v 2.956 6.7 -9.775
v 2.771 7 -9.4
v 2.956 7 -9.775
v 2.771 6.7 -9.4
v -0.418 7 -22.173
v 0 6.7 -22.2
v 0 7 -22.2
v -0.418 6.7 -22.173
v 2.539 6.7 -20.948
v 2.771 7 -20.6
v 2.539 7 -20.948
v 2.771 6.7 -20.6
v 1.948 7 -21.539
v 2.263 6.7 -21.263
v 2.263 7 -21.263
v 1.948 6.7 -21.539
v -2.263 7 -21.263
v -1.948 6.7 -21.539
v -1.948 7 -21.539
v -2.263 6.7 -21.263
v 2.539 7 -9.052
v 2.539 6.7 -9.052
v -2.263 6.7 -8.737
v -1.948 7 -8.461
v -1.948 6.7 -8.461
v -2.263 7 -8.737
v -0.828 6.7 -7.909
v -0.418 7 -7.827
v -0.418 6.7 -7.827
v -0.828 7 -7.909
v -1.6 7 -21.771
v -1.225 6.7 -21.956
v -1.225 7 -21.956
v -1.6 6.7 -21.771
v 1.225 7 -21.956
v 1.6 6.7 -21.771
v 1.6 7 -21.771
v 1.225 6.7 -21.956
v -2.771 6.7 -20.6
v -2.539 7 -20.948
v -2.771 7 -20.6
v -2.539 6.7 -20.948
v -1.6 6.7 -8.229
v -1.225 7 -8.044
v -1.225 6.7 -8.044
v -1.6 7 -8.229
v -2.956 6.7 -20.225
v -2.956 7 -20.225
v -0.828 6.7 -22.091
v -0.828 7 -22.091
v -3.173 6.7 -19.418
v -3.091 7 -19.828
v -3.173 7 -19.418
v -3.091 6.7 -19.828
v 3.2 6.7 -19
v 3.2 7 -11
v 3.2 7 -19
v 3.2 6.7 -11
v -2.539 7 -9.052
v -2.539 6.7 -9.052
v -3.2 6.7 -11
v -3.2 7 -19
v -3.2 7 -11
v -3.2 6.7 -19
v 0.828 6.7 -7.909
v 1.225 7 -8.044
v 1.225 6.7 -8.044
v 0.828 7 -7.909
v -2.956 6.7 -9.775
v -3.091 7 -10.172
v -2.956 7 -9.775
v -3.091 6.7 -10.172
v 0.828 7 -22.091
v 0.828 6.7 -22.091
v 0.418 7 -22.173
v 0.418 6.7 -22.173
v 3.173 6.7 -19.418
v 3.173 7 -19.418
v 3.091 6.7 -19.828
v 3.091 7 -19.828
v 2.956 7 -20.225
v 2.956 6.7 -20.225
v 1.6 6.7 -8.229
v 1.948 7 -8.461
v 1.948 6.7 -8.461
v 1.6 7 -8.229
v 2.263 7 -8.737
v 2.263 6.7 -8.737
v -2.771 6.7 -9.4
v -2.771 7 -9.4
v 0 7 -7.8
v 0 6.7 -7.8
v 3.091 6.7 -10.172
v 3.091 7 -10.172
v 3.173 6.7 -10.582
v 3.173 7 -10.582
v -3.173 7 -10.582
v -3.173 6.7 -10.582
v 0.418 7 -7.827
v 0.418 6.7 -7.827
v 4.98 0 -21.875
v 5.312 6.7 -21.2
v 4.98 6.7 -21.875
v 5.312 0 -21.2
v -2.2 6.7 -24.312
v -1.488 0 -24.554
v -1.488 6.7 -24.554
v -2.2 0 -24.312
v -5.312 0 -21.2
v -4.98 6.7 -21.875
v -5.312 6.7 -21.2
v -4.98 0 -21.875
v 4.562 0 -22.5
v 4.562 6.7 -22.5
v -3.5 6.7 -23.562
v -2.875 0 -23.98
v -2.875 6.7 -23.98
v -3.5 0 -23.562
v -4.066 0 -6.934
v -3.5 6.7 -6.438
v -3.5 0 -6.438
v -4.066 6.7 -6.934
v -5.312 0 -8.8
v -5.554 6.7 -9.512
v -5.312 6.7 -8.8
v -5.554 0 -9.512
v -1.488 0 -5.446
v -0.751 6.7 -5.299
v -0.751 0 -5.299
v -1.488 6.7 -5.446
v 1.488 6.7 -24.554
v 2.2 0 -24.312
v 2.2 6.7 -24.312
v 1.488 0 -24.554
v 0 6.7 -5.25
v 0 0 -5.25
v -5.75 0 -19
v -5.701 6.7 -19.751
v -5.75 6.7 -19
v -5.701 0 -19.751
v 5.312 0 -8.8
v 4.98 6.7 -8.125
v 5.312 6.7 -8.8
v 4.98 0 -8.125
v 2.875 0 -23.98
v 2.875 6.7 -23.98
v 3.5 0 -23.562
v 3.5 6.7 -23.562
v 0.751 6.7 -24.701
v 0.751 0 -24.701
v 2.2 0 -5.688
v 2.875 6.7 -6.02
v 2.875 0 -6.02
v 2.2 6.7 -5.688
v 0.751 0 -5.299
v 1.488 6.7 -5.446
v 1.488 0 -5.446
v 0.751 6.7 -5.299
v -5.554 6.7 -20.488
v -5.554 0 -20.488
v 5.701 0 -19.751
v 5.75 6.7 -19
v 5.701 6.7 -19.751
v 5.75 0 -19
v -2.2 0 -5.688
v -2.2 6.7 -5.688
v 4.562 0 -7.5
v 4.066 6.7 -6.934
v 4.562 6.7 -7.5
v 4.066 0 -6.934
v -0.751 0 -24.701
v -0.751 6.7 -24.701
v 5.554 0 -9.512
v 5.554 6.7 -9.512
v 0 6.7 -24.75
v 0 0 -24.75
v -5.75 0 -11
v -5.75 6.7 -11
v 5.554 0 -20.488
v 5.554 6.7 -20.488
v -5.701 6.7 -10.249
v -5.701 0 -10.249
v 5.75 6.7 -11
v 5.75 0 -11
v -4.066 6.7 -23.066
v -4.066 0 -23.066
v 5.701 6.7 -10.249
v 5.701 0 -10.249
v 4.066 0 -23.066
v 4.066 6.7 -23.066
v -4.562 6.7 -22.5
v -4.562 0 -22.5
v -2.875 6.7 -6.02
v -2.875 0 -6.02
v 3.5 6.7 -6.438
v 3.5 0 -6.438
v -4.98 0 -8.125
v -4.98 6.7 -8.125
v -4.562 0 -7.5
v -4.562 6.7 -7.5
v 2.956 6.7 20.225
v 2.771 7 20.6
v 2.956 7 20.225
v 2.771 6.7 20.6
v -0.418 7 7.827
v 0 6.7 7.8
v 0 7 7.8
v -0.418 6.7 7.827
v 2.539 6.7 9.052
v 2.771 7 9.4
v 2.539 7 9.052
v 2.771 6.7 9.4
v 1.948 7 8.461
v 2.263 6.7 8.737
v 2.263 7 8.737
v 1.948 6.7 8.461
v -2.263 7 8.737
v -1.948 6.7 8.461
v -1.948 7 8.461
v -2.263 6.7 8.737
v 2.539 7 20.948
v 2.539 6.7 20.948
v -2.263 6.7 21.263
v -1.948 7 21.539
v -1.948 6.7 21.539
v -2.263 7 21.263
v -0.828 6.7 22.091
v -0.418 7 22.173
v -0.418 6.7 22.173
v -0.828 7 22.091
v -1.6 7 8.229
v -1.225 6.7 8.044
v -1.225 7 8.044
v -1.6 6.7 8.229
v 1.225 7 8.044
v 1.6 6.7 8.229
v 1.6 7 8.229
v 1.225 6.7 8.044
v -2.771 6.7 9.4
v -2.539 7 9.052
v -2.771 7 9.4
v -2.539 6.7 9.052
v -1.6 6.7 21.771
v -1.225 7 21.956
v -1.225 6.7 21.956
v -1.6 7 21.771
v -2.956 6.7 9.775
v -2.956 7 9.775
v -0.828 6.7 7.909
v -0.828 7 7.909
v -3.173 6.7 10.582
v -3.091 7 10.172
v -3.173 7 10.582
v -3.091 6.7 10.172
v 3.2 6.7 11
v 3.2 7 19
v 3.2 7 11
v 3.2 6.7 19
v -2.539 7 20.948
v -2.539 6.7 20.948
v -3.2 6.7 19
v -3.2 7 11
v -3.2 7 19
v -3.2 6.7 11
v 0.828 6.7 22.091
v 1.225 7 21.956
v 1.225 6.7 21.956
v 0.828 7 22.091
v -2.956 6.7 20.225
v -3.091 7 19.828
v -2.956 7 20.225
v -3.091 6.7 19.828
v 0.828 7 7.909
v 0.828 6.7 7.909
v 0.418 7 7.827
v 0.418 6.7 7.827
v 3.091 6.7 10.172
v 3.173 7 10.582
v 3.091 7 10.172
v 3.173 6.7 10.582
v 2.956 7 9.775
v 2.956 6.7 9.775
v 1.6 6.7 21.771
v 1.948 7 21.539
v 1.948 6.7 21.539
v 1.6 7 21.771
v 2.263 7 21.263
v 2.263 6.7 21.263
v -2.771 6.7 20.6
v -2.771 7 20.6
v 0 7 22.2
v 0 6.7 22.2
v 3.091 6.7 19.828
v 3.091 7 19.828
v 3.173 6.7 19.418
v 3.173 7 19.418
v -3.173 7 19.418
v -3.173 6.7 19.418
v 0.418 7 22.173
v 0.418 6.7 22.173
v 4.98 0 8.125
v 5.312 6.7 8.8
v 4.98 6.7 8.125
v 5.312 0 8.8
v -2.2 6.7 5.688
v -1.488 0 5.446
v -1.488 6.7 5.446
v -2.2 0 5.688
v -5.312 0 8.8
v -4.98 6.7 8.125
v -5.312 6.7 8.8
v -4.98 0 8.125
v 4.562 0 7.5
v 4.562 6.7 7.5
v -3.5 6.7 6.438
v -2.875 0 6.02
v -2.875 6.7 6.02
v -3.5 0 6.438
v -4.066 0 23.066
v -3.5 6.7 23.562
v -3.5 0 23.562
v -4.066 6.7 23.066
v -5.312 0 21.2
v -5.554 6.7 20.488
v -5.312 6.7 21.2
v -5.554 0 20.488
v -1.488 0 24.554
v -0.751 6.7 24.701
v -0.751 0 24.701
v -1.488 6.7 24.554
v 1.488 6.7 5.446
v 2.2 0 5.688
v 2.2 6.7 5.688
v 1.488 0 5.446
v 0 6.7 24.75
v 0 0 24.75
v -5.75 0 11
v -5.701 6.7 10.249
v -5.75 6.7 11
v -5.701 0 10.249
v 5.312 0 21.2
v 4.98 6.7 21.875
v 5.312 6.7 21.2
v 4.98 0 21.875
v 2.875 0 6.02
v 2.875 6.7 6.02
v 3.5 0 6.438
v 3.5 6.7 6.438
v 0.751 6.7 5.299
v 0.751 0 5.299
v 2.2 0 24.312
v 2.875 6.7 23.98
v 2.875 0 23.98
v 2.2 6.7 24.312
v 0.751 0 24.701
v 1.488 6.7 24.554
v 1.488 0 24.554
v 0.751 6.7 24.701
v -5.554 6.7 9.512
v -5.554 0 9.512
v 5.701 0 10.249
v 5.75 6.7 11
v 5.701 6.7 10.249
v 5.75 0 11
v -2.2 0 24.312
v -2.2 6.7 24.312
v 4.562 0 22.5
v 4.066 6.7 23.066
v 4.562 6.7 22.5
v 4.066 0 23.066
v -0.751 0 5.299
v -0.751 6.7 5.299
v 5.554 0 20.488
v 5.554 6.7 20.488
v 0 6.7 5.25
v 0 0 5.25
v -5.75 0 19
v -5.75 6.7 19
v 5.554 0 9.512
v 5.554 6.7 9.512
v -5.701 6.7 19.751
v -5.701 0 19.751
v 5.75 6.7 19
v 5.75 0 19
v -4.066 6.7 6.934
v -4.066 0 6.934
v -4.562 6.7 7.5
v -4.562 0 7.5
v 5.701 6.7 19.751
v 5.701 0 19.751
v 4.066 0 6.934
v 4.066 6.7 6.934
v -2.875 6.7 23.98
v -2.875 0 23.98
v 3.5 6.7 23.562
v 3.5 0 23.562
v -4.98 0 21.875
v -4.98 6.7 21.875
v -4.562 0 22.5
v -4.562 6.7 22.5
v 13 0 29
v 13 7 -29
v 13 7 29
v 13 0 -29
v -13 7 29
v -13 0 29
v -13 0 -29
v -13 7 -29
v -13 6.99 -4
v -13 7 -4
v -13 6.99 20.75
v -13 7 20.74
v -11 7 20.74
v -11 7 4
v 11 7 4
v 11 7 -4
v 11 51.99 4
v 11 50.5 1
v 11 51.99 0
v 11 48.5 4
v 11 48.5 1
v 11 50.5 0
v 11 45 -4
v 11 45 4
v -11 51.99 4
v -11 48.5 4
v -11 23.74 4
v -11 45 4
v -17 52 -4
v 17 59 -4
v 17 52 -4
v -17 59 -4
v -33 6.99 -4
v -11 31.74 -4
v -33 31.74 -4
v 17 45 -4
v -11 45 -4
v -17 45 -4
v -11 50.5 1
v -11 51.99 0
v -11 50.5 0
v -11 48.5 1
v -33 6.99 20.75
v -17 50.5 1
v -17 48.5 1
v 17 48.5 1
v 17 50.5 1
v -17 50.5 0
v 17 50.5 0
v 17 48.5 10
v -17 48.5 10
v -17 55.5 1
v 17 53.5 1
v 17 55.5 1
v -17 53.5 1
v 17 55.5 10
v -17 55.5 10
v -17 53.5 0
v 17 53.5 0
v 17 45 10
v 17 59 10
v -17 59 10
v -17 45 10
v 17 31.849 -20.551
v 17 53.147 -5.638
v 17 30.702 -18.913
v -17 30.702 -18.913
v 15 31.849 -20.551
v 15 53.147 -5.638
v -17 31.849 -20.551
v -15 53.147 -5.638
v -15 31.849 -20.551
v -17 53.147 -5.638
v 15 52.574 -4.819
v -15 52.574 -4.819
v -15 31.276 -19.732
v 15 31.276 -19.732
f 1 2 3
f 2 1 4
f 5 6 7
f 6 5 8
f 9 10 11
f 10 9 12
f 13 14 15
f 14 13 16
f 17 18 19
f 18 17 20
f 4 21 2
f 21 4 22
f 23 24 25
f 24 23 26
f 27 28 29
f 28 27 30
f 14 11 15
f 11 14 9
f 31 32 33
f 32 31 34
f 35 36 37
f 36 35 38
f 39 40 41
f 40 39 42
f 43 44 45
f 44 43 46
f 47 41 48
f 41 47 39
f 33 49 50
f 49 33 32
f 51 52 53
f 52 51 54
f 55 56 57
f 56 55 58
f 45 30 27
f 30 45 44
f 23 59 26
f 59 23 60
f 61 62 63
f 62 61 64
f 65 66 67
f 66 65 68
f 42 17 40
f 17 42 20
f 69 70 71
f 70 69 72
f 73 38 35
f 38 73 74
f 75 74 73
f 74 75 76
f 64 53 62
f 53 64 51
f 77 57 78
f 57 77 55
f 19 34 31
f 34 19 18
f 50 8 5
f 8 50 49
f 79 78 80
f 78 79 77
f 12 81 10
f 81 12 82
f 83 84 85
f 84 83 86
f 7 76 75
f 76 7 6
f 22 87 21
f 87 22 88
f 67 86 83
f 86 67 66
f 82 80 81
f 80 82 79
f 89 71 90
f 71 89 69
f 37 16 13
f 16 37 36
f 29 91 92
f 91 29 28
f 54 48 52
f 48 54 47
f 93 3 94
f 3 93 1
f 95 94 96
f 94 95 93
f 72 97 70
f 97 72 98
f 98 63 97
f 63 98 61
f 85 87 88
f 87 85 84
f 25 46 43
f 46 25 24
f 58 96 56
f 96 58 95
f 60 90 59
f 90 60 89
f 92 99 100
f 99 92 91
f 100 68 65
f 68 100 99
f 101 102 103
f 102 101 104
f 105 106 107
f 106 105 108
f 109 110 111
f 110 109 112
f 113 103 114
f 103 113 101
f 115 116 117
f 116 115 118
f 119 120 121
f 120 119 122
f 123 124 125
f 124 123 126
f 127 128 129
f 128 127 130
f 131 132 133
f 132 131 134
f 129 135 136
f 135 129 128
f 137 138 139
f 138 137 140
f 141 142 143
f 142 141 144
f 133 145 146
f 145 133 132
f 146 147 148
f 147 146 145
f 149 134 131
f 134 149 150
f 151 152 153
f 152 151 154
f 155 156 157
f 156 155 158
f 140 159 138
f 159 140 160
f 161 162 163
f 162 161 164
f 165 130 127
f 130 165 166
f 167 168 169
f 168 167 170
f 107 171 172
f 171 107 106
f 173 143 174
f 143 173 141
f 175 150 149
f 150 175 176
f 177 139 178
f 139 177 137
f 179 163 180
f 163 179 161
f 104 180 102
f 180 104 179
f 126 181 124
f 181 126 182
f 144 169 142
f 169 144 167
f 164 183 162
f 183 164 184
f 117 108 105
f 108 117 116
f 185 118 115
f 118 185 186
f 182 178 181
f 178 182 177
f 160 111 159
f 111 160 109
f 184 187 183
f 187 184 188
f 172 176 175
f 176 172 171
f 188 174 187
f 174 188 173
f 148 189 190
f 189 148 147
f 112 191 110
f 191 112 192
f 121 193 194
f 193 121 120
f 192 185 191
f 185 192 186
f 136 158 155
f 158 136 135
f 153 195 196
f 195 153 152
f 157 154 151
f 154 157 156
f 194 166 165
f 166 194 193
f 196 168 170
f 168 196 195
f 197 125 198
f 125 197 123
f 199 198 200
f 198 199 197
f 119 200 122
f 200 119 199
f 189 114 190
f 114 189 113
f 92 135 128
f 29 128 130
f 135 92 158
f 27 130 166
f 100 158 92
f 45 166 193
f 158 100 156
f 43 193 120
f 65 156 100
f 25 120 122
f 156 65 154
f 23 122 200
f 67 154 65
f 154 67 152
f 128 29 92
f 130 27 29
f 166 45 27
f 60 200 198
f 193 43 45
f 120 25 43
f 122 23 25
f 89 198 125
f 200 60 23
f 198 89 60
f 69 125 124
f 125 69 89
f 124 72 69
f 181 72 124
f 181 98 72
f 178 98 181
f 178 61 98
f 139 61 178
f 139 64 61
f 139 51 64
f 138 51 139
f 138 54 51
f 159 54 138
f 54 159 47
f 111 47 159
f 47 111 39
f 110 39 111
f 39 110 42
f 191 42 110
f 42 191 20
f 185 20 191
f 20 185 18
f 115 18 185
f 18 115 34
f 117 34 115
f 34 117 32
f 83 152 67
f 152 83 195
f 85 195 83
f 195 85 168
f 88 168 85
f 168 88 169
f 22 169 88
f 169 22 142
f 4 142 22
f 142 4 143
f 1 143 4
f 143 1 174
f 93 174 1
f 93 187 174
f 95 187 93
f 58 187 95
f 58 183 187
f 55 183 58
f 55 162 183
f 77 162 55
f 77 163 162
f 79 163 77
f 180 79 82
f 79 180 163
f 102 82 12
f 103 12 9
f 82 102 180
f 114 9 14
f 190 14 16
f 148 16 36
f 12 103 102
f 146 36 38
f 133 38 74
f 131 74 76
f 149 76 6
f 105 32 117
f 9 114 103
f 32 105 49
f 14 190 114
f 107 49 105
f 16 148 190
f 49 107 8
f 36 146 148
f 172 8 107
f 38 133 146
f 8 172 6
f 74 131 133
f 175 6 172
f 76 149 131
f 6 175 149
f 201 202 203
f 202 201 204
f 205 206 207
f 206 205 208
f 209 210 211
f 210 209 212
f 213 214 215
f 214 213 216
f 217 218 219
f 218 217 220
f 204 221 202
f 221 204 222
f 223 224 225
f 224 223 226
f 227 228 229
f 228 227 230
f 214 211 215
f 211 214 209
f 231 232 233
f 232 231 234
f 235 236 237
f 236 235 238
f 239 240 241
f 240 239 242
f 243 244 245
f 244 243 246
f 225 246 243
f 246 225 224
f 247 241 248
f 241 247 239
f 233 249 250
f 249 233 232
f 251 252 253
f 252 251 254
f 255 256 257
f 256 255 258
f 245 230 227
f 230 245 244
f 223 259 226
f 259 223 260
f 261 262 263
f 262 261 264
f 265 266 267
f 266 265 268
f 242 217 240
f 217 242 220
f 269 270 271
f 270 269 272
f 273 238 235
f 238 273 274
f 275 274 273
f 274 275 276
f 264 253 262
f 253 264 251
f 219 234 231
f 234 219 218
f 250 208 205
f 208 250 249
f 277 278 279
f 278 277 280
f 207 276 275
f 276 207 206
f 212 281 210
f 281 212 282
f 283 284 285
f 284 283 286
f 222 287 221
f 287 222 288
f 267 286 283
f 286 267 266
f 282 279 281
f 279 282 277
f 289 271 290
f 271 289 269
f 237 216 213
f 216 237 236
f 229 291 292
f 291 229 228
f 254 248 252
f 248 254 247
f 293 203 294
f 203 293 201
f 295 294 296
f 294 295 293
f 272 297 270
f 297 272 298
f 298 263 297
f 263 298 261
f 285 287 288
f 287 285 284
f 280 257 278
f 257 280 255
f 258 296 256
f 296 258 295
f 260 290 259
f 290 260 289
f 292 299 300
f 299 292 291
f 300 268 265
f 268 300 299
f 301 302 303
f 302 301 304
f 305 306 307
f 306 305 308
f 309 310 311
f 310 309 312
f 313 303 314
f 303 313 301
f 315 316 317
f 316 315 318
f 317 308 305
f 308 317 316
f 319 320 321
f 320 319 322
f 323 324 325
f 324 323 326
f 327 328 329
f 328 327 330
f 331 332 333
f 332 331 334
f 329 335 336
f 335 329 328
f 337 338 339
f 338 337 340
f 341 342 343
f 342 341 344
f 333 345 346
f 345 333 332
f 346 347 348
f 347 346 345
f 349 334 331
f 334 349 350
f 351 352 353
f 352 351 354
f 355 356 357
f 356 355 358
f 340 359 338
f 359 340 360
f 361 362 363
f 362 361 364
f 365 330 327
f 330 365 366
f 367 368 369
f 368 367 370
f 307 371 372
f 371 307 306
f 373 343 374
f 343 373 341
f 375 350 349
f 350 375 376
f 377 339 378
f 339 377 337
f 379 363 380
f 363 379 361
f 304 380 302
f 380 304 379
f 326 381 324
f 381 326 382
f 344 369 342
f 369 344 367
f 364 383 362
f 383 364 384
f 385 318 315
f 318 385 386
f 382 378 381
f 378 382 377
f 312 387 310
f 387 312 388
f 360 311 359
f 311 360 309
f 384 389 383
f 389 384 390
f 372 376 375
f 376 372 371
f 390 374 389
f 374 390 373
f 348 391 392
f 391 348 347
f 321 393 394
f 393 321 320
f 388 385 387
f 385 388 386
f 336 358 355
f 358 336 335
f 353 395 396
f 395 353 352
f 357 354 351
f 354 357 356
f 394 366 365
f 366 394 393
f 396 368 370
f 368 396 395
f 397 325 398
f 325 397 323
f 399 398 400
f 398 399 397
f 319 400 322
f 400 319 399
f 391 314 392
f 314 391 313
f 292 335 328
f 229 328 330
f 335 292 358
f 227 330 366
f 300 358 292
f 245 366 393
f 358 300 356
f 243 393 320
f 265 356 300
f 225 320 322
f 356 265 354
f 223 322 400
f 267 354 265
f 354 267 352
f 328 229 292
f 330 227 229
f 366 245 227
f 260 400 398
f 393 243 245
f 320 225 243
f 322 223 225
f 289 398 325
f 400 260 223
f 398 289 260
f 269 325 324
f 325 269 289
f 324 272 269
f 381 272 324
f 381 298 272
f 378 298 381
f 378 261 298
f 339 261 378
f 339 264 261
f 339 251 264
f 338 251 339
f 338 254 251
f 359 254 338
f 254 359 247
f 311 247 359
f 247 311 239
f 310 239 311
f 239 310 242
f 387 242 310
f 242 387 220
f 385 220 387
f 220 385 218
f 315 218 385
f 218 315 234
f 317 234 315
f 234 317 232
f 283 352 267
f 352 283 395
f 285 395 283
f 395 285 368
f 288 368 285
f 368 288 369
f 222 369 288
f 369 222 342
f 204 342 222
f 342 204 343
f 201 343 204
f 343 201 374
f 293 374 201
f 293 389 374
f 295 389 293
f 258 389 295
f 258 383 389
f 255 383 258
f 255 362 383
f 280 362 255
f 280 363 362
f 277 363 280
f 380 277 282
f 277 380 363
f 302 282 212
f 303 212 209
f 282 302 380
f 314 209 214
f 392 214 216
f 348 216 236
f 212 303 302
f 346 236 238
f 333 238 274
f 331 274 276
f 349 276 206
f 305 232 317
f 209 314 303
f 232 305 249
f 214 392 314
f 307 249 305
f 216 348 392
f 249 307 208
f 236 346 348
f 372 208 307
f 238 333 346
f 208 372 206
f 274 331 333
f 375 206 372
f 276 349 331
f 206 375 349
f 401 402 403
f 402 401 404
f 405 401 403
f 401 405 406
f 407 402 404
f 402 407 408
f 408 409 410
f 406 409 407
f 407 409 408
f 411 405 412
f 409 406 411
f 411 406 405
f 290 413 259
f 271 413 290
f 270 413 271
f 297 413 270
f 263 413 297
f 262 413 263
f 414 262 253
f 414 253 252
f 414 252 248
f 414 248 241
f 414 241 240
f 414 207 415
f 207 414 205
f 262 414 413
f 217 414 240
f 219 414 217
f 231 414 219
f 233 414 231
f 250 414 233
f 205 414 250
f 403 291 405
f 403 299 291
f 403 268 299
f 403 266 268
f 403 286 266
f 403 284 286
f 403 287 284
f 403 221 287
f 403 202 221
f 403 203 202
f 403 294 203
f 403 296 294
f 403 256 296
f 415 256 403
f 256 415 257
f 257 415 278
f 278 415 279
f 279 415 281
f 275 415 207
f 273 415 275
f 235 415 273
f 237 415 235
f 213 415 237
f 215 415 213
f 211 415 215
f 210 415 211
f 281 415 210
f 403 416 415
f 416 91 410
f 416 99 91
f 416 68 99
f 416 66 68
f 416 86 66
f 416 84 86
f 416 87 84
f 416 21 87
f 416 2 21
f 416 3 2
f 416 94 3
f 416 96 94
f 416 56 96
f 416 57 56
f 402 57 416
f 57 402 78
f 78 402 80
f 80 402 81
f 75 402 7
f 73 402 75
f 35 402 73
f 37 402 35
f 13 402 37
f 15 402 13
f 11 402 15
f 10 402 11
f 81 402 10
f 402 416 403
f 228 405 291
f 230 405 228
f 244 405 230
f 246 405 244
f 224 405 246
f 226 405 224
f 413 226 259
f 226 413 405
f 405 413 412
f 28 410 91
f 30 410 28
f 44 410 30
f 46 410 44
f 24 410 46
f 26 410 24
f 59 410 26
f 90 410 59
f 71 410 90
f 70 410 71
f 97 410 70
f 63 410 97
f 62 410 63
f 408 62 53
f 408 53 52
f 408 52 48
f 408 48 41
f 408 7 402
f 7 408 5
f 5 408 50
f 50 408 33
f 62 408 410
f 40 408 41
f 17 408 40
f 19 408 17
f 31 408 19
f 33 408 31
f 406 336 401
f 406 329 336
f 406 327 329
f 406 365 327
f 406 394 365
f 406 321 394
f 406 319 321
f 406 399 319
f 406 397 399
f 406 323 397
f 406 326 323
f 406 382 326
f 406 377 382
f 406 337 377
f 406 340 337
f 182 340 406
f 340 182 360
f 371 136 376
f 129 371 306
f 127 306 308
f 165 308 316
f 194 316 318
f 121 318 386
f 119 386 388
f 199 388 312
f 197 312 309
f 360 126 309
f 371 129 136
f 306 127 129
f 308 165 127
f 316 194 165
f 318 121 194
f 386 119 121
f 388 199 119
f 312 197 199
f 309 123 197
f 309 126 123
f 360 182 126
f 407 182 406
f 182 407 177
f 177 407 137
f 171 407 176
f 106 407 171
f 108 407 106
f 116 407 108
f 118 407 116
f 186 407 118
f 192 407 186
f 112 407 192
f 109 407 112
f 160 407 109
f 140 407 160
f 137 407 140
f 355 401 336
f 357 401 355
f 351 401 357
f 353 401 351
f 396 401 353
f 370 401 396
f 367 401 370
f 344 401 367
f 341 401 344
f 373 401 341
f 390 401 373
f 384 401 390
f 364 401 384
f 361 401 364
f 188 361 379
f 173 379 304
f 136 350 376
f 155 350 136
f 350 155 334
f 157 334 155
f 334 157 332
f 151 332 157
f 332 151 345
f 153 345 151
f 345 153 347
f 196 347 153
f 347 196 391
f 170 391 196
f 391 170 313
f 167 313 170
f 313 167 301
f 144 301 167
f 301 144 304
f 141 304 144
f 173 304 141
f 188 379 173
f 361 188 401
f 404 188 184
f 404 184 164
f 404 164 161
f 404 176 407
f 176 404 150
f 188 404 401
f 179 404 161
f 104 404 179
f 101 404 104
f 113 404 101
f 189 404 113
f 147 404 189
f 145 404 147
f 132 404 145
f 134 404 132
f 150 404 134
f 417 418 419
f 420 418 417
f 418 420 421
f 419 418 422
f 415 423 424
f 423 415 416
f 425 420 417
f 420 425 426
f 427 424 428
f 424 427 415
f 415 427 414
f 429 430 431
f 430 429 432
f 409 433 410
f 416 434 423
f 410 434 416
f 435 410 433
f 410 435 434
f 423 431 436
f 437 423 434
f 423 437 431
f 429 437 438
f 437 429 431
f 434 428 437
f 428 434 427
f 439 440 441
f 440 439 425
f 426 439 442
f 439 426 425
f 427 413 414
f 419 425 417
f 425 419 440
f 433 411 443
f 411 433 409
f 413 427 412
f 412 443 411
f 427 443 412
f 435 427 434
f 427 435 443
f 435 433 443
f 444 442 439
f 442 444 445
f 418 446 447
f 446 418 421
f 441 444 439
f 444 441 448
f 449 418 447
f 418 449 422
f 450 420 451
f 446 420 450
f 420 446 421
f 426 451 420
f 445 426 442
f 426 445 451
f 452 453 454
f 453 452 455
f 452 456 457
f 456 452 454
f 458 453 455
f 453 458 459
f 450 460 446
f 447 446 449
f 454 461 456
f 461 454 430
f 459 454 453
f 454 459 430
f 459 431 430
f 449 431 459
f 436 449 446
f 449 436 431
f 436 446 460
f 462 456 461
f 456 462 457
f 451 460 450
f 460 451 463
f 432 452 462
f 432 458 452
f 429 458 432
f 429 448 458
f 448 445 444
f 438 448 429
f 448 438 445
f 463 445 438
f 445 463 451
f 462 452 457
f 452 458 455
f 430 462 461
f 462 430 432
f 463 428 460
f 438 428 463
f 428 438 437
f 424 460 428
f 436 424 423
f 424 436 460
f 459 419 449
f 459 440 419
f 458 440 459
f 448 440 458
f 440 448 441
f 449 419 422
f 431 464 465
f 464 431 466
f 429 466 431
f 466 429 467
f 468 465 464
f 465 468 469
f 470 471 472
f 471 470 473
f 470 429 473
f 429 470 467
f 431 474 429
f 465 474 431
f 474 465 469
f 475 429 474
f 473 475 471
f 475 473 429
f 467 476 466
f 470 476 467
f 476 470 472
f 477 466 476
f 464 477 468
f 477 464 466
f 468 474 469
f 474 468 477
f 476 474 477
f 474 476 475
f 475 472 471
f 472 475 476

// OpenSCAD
// ═══════════════════════════════════════════════════════════════════════════
//  ESSUIE-BUSE double lèvre + goulotte — VCore 3.1
//
//  Conception : la buse passe ENTRE deux lèvres silicone opposées, ce qui
//  l'essuie des deux côtés en un seul passage (au lieu d'un seul côté avec
//  une lèvre unique). Fixation sur profilé par trous OBLONGS verticaux : la
//  hauteur se rattrape quand le silicone s'use, sans réimprimer.
//
//  Sur une VCore 3 le portique est fixe en Z : une fois la hauteur réglée,
//  elle ne bouge plus jamais.
//
//  ── UTILISATION ──────────────────────────────────────────────────────────
//  1. Ouvre ce fichier dans OpenSCAD (gratuit : openscad.org)
//  2. Ajuste les paramètres de la section RÉGLAGES ci-dessous
//  3. F5 pour prévisualiser, F6 pour le rendu final
//  4. Fichier → Exporter → Exporter en STL
//
//  ⚠️ MESURE D'ABORD (les 3 valeurs critiques) :
//     - la largeur de rainure de ton profilé (VCore 3 = 3030, rainure 8 mm)
//     - l'épaisseur de ta bande silicone
//     - la distance profilé → buse, pour régler arm_length
// ═══════════════════════════════════════════════════════════════════════════

/* [RÉGLAGES — fixation sur profilé] */
extrusion_slot_w   = 8;      // largeur de rainure du profilé (3030 → 8 mm)
screw_d            = 6.4;    // diamètre de passage vis M6 (jeu inclus)
screw_head_d       = 11.5;   // diamètre tête vis M6 (lamage)
screw_spacing      = 30;     // entraxe vertical des 2 vis
slot_travel        = 8;      // course du réglage en hauteur (trou oblong)
back_plate_w       = 26;     // largeur de la plaque arrière
back_plate_t       = 7;      // épaisseur de la plaque arrière

/* [RÉGLAGES — bras] */
arm_length         = 45;     // longueur profilé → centre de la brosse
arm_w              = 22;     // largeur du bras
arm_t              = 8;      // épaisseur du bras (rigidité)

/* [RÉGLAGES — lèvres silicone] */
lip_slot_t         = 2.0;    // épaisseur de ta bande silicone (+0.2 de jeu)
lip_gap            = 3.0;    // écart entre les 2 lèvres — un peu MOINS que
                             //   le diamètre du corps de buse pour que ça
                             //   frotte. 3 mm convient pour une buse standard.
lip_slot_depth     = 9;      // profondeur d'enfoncement des bandes
lip_holder_w       = 34;     // largeur du porte-lèvres (= longueur essuyée)
lip_holder_h       = 14;     // hauteur du bloc porte-lèvres

/* [RÉGLAGES — goulotte d'évacuation] */
chute_enabled      = true;   // false = pas de goulotte
chute_len          = 26;     // longueur de la goulotte
chute_angle        = 35;     // inclinaison (°) — plus = évacue mieux
chute_wall         = 2.0;    // épaisseur de paroi

/* [Rendu] */
$fn = 48;
eps = 0.01;

// ═══════════════════════════════════════════════════════════════════════════

module slotted_hole(d, travel, depth) {
    // Trou oblong vertical = réglage de hauteur après montage
    hull() {
        translate([0, 0,  travel/2]) rotate([90,0,0]) cylinder(d = d, h = depth, center = true);
        translate([0, 0, -travel/2]) rotate([90,0,0]) cylinder(d = d, h = depth, center = true);
    }
}

module back_plate() {
    difference() {
        // plaque contre le profilé, coins adoucis
        translate([-back_plate_w/2, 0, -(screw_spacing/2 + 14)])
            cube([back_plate_w, back_plate_t, screw_spacing + 28]);

        // 2 fixations oblongues M6
        for (z = [-screw_spacing/2, screw_spacing/2]) {
            translate([0, back_plate_t/2, z]) {
                slotted_hole(screw_d, slot_travel, back_plate_t + 2);
                // lamage de tête, côté extérieur
                translate([0, -back_plate_t/2 + 3.2, 0])
                    slotted_hole(screw_head_d, slot_travel, back_plate_t);
            }
        }
    }
}

module arm() {
    // Bras cantilever + gousset triangulaire pour la rigidité
    translate([-arm_w/2, back_plate_t - eps, -arm_t/2])
        cube([arm_w, arm_length, arm_t]);

    // gousset : évite que le bras fléchisse au contact de la buse
    translate([-arm_w/2, back_plate_t - eps, -arm_t/2])
        rotate([0, -90, 0])
            linear_extrude(height = arm_w)
                polygon([[0,0], [0, arm_length*0.55], [arm_length*0.55, 0]]);
}

module lip_holder() {
    // Bloc percé de 2 fentes verticales qui reçoivent les bandes silicone.
    // La buse passe dans l'espace « lip_gap » entre les deux.
    y0 = back_plate_t + arm_length;

    difference() {
        translate([-lip_holder_w/2, y0 - lip_holder_h/2, -arm_t/2])
            cube([lip_holder_w, lip_holder_h, lip_holder_h]);

        // couloir de passage de la buse (traversant en X)
        translate([-lip_holder_w/2 - 1, y0 - lip_gap/2, -arm_t/2 + 4])
            cube([lip_holder_w + 2, lip_gap, lip_holder_h]);

        // les 2 fentes à bandes silicone, de part et d'autre du couloir
        for (s = [-1, 1]) {
            translate([-lip_holder_w/2 - 1,
                       y0 + s*(lip_gap/2 + lip_slot_t/2) - lip_slot_t/2,
                       -arm_t/2 + lip_holder_h - lip_slot_depth])
                cube([lip_holder_w + 2, lip_slot_t, lip_slot_depth + 1]);
        }
    }
}

module chute() {
    // Goulotte inclinée sous le porte-lèvres : les résidus glissent au lieu
    // de s'accumuler sur la pièce.
    y0 = back_plate_t + arm_length;
    translate([0, y0, -arm_t/2])
        rotate([chute_angle, 0, 0])
            difference() {
                translate([-lip_holder_w/2, -chute_len, -chute_wall])
                    cube([lip_holder_w, chute_len, chute_wall]);
                // rebords latéraux creusés pour canaliser
                translate([-lip_holder_w/2 + chute_wall, -chute_len - 1, -chute_wall - 1])
                    cube([lip_holder_w - 2*chute_wall, chute_len + 2, chute_wall]);
            }
}

module nozzle_wiper() {
    back_plate();
    arm();
    lip_holder();
    if (chute_enabled) chute();
}

nozzle_wiper();

// ═══════════════════════════════════════════════════════════════════════════
//  IMPRESSION
//    Orientation : plaque arrière à plat sur le plateau (bras vers le haut)
//    Matériau    : PETG ou ABS — surtout PAS de PLA, la buse chaude passe à
//                  côté et le PLA flue vers 60 °C
//    Parois      : 4 · Remplissage : 40 % · Supports : uniquement sous le bras
//
//  RÉGLAGE APRÈS MONTAGE
//    1. Visse sans serrer à fond (les trous oblongs laissent du jeu)
//    2. G28 puis descends le plateau (G1 Z80)
//    3. Amène la buse au niveau des lèvres, ajuste la hauteur à la main
//       pour que les lèvres frottent franchement sans forcer
//    4. Serre les vis
//    5. Relève X d'entrée / X de sortie / Y → à reporter dans _WIPE_CONF
//       du fichier nozzle-wiper.cfg
// ═══════════════════════════════════════════════════════════════════════════
